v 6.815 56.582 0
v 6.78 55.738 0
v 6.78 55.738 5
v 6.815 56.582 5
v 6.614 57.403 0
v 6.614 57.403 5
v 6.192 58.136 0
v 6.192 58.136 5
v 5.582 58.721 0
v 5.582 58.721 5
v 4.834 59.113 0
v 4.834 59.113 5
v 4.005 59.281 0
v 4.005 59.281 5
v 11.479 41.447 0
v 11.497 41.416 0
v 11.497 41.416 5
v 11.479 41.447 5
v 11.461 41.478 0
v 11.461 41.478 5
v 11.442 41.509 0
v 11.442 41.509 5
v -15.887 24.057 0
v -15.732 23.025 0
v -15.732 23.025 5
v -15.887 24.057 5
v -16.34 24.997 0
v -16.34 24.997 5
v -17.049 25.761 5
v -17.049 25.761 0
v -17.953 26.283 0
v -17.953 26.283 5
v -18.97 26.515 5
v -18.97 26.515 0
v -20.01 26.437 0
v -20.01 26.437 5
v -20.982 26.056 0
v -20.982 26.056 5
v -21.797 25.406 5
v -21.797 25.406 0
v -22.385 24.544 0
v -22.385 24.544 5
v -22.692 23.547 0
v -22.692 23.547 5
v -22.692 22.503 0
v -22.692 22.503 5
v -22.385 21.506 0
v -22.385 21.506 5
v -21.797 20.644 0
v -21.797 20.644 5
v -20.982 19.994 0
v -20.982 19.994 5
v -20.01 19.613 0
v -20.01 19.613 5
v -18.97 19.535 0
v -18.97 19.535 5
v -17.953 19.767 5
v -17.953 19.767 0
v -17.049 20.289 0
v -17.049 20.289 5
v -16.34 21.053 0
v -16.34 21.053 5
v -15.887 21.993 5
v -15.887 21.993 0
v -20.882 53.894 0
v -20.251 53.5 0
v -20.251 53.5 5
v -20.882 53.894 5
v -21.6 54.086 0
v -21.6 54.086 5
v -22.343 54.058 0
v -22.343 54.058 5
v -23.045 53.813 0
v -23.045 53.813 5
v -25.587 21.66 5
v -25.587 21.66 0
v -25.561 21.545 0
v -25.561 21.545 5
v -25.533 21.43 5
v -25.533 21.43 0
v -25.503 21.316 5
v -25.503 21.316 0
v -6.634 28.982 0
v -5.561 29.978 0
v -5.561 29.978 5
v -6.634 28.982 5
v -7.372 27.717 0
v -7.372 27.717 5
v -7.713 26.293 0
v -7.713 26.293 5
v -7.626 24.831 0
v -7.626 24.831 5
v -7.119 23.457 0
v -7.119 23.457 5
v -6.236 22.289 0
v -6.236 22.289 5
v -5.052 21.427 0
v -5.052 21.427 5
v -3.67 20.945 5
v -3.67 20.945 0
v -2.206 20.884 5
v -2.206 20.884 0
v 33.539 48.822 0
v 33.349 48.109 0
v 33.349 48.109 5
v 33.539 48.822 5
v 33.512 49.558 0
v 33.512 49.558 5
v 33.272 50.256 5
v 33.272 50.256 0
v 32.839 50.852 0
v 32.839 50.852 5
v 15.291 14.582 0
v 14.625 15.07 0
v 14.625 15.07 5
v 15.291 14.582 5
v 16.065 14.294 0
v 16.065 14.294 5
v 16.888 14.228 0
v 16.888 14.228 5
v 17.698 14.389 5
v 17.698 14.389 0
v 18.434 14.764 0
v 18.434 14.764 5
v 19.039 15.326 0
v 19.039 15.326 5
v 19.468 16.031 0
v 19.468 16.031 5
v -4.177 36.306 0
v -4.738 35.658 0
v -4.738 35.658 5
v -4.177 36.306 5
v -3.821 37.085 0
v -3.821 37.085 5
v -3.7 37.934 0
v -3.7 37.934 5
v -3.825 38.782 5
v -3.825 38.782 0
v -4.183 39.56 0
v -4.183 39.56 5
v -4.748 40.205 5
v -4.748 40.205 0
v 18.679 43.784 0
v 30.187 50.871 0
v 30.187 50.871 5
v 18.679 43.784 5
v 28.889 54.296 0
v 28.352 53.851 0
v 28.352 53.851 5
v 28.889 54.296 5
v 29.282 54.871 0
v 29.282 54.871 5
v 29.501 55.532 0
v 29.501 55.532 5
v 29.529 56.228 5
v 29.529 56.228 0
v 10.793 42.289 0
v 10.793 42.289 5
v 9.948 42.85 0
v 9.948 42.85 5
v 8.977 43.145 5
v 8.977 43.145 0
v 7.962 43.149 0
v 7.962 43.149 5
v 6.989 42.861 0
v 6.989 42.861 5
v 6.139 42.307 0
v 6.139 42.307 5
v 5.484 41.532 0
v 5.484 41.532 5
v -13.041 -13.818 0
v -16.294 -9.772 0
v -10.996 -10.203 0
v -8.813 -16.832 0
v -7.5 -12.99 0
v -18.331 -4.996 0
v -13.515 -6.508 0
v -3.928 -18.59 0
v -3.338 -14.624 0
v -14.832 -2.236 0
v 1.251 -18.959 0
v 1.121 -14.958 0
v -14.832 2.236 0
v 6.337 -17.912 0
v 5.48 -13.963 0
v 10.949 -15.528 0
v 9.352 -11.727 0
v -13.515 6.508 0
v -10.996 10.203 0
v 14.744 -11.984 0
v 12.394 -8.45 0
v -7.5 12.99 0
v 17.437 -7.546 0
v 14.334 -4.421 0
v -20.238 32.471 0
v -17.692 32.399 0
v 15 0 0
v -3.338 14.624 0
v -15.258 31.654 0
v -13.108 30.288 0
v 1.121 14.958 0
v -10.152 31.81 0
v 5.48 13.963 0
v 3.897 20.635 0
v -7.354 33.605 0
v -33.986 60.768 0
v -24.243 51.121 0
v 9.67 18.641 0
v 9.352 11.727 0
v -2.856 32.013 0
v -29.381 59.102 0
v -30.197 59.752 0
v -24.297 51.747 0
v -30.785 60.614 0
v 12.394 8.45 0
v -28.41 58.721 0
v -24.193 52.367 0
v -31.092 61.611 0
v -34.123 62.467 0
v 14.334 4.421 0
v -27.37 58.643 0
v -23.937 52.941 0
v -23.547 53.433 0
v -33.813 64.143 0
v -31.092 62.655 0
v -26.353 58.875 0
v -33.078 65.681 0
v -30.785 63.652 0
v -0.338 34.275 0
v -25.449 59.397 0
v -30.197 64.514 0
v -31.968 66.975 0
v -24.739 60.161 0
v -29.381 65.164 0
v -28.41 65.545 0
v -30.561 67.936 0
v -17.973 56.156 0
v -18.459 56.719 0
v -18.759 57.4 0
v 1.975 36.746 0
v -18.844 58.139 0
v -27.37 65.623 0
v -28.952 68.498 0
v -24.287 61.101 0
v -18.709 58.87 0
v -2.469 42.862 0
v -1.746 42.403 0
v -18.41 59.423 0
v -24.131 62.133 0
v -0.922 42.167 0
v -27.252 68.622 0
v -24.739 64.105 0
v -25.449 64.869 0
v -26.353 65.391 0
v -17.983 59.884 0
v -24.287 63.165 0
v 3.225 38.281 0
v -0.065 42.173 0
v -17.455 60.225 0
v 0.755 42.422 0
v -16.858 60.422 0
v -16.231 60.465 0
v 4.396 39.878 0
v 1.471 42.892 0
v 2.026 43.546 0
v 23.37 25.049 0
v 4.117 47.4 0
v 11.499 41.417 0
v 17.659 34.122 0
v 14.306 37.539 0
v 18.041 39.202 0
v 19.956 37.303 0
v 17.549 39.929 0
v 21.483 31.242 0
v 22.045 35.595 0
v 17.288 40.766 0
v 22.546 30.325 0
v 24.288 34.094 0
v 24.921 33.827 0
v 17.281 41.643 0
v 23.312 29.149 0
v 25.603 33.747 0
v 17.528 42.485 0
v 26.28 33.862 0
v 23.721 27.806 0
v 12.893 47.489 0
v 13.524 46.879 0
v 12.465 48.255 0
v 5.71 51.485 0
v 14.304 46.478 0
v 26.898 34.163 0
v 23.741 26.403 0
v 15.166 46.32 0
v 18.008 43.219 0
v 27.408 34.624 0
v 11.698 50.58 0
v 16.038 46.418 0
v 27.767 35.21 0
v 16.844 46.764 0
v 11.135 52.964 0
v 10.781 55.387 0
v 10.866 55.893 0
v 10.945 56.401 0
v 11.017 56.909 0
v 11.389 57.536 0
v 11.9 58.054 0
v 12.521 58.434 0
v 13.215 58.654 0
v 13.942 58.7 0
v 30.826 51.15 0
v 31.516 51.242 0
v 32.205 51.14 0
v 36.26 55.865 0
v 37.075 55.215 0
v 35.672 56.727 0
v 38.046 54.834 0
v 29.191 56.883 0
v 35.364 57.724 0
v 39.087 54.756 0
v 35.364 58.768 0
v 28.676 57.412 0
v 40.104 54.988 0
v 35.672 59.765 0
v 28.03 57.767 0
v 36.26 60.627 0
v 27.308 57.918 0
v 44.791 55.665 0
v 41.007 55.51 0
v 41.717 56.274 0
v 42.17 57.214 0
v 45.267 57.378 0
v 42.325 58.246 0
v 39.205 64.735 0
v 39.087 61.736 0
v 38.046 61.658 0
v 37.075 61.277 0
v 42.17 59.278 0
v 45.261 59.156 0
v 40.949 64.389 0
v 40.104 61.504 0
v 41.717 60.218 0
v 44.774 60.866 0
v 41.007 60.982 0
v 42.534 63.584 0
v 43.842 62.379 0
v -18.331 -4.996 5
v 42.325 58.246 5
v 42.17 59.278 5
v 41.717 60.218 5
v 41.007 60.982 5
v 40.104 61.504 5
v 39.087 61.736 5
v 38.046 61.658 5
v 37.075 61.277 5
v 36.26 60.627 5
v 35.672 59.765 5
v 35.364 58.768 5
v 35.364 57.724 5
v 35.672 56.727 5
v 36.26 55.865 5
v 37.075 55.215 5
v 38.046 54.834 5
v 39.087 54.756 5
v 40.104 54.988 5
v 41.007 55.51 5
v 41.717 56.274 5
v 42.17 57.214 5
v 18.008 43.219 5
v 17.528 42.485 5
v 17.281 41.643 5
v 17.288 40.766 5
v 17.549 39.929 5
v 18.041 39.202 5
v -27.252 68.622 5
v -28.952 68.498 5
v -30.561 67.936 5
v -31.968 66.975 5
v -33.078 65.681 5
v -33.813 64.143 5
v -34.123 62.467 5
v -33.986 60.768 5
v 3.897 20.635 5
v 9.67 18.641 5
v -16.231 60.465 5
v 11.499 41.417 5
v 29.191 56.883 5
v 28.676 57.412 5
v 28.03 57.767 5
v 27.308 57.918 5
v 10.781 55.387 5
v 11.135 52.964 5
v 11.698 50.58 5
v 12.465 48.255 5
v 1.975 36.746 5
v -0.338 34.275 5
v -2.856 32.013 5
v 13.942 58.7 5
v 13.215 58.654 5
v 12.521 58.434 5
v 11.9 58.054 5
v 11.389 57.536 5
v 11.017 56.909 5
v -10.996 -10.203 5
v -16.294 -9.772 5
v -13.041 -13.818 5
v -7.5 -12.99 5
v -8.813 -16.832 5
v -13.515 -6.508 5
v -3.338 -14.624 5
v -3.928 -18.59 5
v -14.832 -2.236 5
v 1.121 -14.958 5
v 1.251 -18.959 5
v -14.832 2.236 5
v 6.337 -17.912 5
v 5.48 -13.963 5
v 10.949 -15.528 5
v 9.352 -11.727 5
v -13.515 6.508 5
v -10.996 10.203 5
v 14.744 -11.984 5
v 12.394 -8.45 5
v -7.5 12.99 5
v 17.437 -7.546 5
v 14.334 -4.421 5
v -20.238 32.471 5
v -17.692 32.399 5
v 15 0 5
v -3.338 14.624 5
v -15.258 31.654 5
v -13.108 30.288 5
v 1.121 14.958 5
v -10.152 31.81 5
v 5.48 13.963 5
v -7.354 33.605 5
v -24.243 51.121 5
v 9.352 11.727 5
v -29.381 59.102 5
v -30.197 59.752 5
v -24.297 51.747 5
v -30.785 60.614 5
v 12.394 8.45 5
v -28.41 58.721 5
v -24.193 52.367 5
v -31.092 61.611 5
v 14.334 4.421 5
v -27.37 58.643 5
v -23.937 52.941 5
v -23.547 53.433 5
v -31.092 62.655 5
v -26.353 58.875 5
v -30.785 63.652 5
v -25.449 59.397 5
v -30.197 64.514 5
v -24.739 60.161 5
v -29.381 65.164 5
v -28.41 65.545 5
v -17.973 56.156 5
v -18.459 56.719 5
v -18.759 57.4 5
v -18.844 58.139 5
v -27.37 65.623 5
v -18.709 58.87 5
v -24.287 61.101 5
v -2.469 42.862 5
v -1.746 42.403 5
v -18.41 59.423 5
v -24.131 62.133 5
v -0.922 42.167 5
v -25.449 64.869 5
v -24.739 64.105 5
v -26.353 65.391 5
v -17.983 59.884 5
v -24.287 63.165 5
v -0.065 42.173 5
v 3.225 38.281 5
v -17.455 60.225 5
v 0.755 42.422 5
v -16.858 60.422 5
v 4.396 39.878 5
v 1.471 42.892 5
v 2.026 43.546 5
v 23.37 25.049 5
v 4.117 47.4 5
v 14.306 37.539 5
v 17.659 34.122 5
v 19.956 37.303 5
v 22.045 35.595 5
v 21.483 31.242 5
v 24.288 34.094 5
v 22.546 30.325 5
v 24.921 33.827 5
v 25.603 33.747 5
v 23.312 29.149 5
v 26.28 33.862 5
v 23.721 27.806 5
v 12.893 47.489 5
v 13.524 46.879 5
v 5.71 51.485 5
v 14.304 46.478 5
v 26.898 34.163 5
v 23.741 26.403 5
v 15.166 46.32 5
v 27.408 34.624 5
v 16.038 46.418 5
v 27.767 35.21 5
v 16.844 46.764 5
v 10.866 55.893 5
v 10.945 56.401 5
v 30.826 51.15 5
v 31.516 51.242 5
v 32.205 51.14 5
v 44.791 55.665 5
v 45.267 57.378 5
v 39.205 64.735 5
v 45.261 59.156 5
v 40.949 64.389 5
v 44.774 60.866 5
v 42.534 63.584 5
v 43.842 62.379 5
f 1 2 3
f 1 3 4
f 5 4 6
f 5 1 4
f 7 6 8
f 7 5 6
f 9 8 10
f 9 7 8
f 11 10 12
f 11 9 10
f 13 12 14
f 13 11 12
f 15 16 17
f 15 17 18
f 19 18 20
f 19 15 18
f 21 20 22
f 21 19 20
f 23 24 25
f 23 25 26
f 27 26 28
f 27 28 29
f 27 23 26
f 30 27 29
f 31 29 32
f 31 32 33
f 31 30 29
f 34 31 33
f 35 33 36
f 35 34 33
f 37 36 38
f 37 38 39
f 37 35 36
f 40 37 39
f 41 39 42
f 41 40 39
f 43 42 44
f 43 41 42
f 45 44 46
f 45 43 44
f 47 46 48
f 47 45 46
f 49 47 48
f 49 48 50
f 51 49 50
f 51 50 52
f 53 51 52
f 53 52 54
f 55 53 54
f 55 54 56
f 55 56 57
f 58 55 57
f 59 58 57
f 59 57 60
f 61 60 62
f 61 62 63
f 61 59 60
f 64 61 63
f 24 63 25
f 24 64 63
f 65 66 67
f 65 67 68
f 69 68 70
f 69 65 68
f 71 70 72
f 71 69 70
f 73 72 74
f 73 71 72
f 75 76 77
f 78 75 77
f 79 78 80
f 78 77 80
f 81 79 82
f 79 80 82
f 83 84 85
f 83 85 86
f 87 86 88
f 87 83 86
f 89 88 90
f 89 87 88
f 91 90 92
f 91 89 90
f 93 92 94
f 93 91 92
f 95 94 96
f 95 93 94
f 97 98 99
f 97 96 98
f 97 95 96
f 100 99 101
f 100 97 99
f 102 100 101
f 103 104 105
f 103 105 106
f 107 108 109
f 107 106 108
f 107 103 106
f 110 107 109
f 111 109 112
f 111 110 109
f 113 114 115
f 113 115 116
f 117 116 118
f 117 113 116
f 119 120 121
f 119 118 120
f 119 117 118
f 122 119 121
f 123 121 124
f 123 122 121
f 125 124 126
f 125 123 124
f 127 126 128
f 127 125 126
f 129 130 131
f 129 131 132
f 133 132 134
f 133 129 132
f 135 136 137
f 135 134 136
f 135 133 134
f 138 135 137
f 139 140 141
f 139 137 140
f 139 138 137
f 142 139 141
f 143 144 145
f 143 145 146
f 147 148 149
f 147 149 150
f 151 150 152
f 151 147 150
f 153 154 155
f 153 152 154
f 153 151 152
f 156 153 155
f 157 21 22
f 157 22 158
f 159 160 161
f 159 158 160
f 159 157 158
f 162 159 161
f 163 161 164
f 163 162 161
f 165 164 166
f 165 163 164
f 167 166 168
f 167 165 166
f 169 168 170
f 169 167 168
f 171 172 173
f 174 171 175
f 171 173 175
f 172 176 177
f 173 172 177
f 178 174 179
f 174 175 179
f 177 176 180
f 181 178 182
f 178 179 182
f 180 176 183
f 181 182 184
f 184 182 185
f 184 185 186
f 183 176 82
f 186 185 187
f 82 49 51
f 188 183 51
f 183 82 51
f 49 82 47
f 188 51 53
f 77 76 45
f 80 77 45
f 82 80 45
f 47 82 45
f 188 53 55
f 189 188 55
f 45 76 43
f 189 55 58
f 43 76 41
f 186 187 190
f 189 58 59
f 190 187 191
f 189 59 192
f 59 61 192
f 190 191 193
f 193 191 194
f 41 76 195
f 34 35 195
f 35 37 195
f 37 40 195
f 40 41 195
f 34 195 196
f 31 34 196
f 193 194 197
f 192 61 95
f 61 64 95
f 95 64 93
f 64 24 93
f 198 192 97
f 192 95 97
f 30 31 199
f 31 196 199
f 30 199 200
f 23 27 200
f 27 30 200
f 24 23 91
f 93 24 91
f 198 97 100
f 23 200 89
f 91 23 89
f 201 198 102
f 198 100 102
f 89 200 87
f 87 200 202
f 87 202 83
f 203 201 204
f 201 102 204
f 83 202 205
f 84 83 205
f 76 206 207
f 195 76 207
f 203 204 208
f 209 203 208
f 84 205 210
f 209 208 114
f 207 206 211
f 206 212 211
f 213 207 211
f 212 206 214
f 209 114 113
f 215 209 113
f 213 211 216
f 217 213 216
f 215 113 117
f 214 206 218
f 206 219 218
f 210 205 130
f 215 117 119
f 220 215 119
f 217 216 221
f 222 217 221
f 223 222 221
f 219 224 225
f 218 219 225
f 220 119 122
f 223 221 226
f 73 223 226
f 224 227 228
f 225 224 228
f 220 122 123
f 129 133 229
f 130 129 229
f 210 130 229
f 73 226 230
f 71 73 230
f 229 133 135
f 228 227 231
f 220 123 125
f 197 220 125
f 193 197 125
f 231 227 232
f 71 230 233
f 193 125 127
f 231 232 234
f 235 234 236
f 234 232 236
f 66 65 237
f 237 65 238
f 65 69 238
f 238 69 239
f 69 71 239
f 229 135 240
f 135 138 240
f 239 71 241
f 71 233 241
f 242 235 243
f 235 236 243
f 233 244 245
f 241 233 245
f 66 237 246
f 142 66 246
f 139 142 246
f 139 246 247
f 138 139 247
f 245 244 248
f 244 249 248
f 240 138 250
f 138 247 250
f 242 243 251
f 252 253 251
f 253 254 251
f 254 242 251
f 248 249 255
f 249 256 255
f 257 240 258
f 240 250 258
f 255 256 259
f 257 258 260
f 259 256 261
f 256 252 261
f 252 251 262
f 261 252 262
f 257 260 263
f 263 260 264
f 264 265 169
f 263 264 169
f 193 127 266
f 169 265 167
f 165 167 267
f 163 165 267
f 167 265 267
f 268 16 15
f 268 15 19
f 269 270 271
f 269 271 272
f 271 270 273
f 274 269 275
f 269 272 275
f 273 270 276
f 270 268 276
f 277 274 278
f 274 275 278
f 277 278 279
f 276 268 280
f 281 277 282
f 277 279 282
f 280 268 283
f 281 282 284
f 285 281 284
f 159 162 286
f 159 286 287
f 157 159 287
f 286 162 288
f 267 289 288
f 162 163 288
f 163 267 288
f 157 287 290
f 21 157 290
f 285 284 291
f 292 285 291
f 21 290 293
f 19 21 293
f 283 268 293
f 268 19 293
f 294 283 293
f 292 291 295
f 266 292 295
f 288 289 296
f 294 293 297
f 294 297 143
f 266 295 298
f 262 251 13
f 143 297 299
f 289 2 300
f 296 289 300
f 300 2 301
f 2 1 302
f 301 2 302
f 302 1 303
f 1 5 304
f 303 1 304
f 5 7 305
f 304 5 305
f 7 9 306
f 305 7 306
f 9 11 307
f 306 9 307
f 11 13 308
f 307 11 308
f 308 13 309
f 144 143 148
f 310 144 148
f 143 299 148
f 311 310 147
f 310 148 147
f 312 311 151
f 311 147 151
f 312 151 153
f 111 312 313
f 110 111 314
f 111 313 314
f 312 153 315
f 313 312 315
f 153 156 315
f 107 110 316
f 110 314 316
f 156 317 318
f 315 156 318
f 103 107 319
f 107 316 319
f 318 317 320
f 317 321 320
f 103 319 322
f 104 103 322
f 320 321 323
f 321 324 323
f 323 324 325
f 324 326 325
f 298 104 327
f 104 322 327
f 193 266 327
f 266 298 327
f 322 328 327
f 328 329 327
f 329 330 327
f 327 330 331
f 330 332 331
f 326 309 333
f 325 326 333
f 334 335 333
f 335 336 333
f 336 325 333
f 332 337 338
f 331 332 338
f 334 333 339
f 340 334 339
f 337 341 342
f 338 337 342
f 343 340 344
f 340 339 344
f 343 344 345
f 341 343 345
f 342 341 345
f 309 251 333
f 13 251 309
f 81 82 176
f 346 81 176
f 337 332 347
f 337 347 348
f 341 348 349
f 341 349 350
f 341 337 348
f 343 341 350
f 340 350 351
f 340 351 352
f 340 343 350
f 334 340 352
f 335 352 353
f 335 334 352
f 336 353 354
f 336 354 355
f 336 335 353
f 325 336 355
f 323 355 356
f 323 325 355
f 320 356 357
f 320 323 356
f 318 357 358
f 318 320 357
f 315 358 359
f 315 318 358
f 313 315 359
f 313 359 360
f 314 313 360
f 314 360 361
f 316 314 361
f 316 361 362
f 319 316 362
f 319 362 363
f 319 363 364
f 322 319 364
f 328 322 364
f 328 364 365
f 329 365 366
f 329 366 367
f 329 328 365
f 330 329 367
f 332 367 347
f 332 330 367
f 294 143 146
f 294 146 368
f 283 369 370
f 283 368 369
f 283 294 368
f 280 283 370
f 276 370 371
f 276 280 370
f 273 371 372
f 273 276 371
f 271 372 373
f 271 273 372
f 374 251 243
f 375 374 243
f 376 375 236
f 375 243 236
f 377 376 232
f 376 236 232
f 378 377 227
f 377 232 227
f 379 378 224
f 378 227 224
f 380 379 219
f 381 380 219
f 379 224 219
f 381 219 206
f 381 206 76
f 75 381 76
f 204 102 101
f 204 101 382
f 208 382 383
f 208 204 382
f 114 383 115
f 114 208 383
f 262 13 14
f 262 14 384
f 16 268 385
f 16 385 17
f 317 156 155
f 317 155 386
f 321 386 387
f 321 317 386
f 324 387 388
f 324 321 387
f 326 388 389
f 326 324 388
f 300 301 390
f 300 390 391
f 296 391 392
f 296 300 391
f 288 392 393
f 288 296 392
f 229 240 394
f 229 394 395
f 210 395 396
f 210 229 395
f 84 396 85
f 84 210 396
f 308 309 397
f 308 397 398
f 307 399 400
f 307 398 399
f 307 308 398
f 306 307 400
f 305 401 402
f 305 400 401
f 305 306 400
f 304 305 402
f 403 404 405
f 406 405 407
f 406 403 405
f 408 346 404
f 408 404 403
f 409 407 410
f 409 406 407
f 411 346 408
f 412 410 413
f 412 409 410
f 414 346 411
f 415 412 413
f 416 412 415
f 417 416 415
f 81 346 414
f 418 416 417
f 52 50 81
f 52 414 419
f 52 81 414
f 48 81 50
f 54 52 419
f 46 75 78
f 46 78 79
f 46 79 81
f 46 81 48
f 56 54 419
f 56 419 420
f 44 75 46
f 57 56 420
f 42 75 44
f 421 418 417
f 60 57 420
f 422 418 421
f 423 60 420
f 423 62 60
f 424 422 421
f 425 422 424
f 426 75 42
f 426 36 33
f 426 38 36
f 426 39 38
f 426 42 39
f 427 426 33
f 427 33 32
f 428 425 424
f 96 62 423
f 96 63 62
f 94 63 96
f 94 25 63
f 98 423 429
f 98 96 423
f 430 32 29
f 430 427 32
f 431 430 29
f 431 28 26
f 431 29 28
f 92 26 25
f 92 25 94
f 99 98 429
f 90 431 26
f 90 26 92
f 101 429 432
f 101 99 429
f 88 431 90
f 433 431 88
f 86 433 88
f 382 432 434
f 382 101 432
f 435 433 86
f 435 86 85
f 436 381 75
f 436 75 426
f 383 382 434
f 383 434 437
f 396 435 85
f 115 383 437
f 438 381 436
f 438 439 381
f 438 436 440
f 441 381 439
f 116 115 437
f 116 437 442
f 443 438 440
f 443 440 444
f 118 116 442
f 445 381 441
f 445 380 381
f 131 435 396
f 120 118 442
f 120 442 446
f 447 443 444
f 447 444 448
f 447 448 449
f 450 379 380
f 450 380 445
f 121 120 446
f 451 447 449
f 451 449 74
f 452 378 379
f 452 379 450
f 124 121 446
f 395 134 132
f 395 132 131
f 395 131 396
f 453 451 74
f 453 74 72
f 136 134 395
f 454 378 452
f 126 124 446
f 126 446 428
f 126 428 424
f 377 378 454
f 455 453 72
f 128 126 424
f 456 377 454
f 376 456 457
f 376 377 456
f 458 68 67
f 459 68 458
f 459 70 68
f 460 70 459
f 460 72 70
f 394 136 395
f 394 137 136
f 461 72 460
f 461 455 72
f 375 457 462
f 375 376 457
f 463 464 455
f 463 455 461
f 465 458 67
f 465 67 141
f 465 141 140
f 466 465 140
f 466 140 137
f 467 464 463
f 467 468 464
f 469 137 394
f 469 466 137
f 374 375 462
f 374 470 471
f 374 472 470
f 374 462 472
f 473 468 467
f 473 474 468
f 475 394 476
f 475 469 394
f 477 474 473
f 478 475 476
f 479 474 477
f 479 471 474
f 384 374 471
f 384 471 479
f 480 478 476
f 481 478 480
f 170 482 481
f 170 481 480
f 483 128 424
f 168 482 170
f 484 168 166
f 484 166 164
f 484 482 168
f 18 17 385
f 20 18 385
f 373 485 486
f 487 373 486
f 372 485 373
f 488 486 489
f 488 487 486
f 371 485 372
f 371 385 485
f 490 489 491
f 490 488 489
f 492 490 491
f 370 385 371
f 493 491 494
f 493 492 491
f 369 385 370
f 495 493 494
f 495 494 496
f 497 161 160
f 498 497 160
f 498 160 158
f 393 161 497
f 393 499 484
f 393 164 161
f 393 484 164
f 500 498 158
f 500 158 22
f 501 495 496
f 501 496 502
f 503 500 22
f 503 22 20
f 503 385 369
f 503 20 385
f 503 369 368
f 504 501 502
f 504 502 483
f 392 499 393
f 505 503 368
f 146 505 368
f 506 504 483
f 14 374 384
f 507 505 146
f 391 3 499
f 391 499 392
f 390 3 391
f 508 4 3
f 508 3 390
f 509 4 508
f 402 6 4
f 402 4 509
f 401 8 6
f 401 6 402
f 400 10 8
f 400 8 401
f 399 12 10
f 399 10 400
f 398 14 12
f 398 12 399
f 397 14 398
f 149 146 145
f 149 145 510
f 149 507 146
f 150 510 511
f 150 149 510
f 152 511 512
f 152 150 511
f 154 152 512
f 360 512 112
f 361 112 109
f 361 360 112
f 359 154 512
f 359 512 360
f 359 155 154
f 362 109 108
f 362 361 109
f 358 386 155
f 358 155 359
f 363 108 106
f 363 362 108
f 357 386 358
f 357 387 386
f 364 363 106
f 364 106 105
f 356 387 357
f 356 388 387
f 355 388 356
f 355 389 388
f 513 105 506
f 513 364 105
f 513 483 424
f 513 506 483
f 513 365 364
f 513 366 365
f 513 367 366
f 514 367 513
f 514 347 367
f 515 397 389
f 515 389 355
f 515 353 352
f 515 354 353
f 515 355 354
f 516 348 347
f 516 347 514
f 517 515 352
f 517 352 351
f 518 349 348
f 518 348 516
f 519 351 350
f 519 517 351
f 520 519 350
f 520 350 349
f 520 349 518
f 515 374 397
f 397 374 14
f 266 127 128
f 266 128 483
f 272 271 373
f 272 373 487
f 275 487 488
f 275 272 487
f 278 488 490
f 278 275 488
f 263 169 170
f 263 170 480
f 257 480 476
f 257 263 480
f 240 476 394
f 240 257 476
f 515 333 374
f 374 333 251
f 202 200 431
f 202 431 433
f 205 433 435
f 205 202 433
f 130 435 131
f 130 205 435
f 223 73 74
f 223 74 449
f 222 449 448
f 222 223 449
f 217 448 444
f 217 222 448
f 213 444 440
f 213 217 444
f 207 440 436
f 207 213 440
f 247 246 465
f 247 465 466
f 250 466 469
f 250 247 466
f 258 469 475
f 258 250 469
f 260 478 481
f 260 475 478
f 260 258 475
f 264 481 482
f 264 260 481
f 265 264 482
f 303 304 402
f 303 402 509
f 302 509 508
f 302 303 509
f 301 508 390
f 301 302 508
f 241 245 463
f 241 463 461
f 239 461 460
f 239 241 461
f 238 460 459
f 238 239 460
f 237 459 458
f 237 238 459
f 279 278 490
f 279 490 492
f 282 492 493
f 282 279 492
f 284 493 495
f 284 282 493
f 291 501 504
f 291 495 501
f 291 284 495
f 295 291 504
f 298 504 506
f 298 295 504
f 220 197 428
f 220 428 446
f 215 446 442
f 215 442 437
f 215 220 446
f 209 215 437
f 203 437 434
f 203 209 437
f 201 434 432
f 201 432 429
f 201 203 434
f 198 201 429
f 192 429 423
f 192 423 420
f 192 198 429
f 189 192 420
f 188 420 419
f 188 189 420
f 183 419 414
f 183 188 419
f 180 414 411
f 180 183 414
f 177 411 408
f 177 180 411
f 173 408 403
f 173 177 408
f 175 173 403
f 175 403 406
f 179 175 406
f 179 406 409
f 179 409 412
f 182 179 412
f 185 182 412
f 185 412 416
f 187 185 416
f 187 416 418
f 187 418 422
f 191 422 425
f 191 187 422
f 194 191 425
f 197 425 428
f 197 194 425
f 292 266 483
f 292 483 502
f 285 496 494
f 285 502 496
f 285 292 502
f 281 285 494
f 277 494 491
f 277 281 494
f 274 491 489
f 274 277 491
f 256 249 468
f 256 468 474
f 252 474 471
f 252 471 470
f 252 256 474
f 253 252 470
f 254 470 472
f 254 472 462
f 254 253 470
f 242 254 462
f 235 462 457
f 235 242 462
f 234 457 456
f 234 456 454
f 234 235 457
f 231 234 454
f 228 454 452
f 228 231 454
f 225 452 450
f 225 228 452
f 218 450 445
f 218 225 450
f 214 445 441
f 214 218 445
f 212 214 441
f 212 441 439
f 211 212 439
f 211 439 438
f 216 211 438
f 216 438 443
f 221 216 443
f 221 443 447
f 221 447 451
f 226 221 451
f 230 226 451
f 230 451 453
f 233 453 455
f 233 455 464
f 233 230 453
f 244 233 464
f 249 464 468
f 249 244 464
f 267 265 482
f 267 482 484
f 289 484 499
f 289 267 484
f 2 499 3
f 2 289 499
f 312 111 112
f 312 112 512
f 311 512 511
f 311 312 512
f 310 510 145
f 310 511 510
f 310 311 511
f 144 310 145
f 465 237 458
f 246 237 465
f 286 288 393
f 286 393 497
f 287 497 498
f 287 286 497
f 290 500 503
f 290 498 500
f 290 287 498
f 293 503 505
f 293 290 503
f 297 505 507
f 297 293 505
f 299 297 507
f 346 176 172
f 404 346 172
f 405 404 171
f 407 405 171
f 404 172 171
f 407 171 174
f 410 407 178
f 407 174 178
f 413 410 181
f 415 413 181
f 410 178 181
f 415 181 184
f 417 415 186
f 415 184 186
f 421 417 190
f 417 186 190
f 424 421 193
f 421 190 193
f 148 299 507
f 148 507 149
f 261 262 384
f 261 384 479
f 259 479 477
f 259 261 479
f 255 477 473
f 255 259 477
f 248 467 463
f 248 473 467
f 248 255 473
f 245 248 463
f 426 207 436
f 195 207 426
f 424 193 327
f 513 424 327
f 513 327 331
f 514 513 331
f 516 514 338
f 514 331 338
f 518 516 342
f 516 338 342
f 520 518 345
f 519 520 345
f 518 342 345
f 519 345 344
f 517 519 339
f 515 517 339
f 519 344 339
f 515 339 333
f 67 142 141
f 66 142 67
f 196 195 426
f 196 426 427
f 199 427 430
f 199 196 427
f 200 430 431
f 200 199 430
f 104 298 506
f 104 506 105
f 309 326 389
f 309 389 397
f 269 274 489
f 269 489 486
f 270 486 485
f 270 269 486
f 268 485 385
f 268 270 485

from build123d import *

# Parameters (mm, degrees)
SKETCH1_R               = 3.5
SKETCH1_R_2             = 15
BOSS_EXTRUDE2_DEPTH     = 5
CUT_EXTRUDE5_DEPTH      = 83.400646631
CUT_EXTRUDE5_DEPTH_BACK = 83.400646631
CUT_EXTRUDE6_DEPTH      = 83.400646631
CUT_EXTRUDE6_DEPTH_BACK = 83.400646631


with BuildPart() as part:
    # Sketch1 → Boss-Extrude2 (new body)
    with BuildSketch(Plane.XY):
        with BuildLine():
            ThreePointArc((-27.25170969, 68.621949973), (-32.565561595, 66.364169918), (-33.986309951, 60.768093886))
            Line((-33.986309951, 60.768093886), (-25.586643761, 21.659966753))
            ThreePointArc((-25.586643761, 21.659966753), (-25.54707355, 21.487234362), (-25.502809349, 21.315644849))
            Line((-25.502809349, 21.315644849), (-18.331305953, -4.996320852))
            ThreePointArc((-18.331305953, -4.996320852), (-1.350797033, -18.951921997), (17.437371999, -7.545731095))
            Line((17.437371999, -7.545731095), (44.790602171, 55.664638301))
            ThreePointArc((44.790602171, 55.664638301), (44.35983755, 61.654536494), (39.204715036, 64.734982954))
            Line((39.204715036, 64.734982954), (-27.25170969, 68.621949973))
        make_face()
        with Locations((-27.631239292, 62.133039642)):
            Circle(SKETCH1_R, mode=Mode.SUBTRACT)
        with Locations((38.825185434, 58.246072623)):
            Circle(SKETCH1_R, mode=Mode.SUBTRACT)
        with Locations((-19.231573102, 23.024912509)):
            Circle(SKETCH1_R, mode=Mode.SUBTRACT)
        Circle(SKETCH1_R_2, mode=Mode.SUBTRACT)
    extrude(amount=BOSS_EXTRUDE2_DEPTH)

    # Sketch7 → Cut-Extrude5 (cut, two sides: drawn at the far end of the back side and taken through both)
    with BuildSketch(Plane.XY.offset(-CUT_EXTRUDE5_DEPTH_BACK)):
        with BuildLine():
            Line((-24.243201443, 51.12071929), (-20.237707665, 32.471482957))
            ThreePointArc((-20.237707665, 32.471482957), (-16.449923424, 32.108547523), (-13.108406148, 30.288301969))
            ThreePointArc((-13.108406148, 30.288301969), (-8.731595333, 32.674535637), (-4.738186305, 35.658370146))
            ThreePointArc((-4.738186305, 35.658370146), (-3.700454424, 37.933841025), (-4.747603131, 40.204993764))
            Line((-4.747603131, 40.204993764), (-20.251388243, 53.499512061))
            ThreePointArc((-20.251388243, 53.499512061), (-21.600184602, 54.086137653), (-23.045406965, 53.812799907))
            ThreePointArc((-23.045406965, 53.812799907), (-24.083058347, 52.661975629), (-24.243201443, 51.12071929))
        make_face()
    extrude(amount=CUT_EXTRUDE5_DEPTH + CUT_EXTRUDE5_DEPTH_BACK, mode=Mode.SUBTRACT)

    # Sketch7<3> → Cut-Extrude6 (cut, two sides: drawn at the far end of the back side and taken through both)
    with BuildSketch(Plane.XY.offset(-CUT_EXTRUDE6_DEPTH_BACK)):
        with BuildLine():
            Line((4.005220181, 59.280947081), (-16.230971238, 60.464540827))
            ThreePointArc((-16.230971238, 60.464540827), (-17.729787246, 60.071141831), (-18.708849124, 58.870038157))
            ThreePointArc((-18.708849124, 58.870038157), (-18.758574348, 57.400004307), (-17.973069241, 56.156439333))
            Line((-17.973069241, 56.156439333), (-2.469284129, 42.861921035))
            ThreePointArc((-2.469284129, 42.861921035), (-0.064983066, 42.173450574), (2.025573232, 43.546122983))
            ThreePointArc((2.025573232, 43.546122983), (4.977414301, 49.417863243), (6.779548794, 55.737911554))
            ThreePointArc((6.779548794, 55.737911554), (6.192076358, 58.135617799), (4.005220181, 59.280947081))
        make_face()
        with BuildLine():
            Line((27.766942681, 35.209644428), (33.348917717, 48.108987643))
            ThreePointArc((33.348917717, 48.108987643), (33.512477865, 49.558438608), (32.839288491, 50.852454099))
            ThreePointArc((32.839288491, 50.852454099), (31.516061413, 51.242367015), (30.18747827, 50.871113983))
            Line((30.18747827, 50.871113983), (18.679272595, 43.783562635))
            ThreePointArc((18.679272595, 43.783562635), (17.281206586, 41.643430104), (18.040522196, 39.202488559))
            ThreePointArc((18.040522196, 39.202488559), (20.980340559, 36.423565175), (24.287649202, 34.094046616))
            ThreePointArc((24.287649202, 34.094046616), (26.280456073, 33.862297186), (27.766942681, 35.209644428))
        make_face()
        with BuildLine():
            ThreePointArc((21.483147911, 31.241894358), (15.918845504, 35.767827579), (11.498679992, 41.416515006))
            Line((11.498679992, 41.416515006), (11.497097402, 41.415540337))
            ThreePointArc((11.497097402, 41.415540337), (8.523648804, 43.182837706), (5.483845255, 41.532282971))
            ThreePointArc((5.483845255, 41.532282971), (0.559543941, 35.183461896), (-5.561267488, 29.978470067))
            ThreePointArc((-5.561267488, 29.978470067), (-7.422805487, 24.125679952), (-2.206440861, 20.883764477))
            ThreePointArc((-2.206440861, 20.883764477), (6.856161822, 19.849258048), (14.625251307, 15.069904585))
            ThreePointArc((14.625251307, 15.069904585), (17.298768965, 14.280178644), (19.467842186, 16.031316872))
            Line((19.467842186, 16.031316872), (23.370103648, 25.049022897))
            ThreePointArc((23.370103648, 25.049022897), (23.564224135, 28.492082606), (21.483147911, 31.241894358))
        make_face()
        with BuildLine():
            Line((16.843883891, 46.763721743), (28.352089566, 53.85127309))
            ThreePointArc((28.352089566, 53.85127309), (29.281554059, 54.870744477), (29.52876331, 56.227989384))
            ThreePointArc((29.52876331, 56.227989384), (28.676191314, 57.411652758), (27.308139041, 57.917983644))
            Line((27.308139041, 57.917983644), (13.941676384, 58.699774114))
            ThreePointArc((13.941676384, 58.699774114), (12.198740022, 58.263103257), (11.01733755, 56.909294999))
            ThreePointArc((11.01733755, 56.909294999), (10.906611403, 56.14688363), (10.780846845, 55.386808205))
            ThreePointArc((10.780846845, 55.386808205), (11.390405083, 51.765860667), (12.465443048, 48.254861422))
            ThreePointArc((12.465443048, 48.254861422), (14.303549595, 46.47831417), (16.843883891, 46.763721743))
        make_face()
    extrude(amount=CUT_EXTRUDE6_DEPTH + CUT_EXTRUDE6_DEPTH_BACK, mode=Mode.SUBTRACT)


solid = part.part
